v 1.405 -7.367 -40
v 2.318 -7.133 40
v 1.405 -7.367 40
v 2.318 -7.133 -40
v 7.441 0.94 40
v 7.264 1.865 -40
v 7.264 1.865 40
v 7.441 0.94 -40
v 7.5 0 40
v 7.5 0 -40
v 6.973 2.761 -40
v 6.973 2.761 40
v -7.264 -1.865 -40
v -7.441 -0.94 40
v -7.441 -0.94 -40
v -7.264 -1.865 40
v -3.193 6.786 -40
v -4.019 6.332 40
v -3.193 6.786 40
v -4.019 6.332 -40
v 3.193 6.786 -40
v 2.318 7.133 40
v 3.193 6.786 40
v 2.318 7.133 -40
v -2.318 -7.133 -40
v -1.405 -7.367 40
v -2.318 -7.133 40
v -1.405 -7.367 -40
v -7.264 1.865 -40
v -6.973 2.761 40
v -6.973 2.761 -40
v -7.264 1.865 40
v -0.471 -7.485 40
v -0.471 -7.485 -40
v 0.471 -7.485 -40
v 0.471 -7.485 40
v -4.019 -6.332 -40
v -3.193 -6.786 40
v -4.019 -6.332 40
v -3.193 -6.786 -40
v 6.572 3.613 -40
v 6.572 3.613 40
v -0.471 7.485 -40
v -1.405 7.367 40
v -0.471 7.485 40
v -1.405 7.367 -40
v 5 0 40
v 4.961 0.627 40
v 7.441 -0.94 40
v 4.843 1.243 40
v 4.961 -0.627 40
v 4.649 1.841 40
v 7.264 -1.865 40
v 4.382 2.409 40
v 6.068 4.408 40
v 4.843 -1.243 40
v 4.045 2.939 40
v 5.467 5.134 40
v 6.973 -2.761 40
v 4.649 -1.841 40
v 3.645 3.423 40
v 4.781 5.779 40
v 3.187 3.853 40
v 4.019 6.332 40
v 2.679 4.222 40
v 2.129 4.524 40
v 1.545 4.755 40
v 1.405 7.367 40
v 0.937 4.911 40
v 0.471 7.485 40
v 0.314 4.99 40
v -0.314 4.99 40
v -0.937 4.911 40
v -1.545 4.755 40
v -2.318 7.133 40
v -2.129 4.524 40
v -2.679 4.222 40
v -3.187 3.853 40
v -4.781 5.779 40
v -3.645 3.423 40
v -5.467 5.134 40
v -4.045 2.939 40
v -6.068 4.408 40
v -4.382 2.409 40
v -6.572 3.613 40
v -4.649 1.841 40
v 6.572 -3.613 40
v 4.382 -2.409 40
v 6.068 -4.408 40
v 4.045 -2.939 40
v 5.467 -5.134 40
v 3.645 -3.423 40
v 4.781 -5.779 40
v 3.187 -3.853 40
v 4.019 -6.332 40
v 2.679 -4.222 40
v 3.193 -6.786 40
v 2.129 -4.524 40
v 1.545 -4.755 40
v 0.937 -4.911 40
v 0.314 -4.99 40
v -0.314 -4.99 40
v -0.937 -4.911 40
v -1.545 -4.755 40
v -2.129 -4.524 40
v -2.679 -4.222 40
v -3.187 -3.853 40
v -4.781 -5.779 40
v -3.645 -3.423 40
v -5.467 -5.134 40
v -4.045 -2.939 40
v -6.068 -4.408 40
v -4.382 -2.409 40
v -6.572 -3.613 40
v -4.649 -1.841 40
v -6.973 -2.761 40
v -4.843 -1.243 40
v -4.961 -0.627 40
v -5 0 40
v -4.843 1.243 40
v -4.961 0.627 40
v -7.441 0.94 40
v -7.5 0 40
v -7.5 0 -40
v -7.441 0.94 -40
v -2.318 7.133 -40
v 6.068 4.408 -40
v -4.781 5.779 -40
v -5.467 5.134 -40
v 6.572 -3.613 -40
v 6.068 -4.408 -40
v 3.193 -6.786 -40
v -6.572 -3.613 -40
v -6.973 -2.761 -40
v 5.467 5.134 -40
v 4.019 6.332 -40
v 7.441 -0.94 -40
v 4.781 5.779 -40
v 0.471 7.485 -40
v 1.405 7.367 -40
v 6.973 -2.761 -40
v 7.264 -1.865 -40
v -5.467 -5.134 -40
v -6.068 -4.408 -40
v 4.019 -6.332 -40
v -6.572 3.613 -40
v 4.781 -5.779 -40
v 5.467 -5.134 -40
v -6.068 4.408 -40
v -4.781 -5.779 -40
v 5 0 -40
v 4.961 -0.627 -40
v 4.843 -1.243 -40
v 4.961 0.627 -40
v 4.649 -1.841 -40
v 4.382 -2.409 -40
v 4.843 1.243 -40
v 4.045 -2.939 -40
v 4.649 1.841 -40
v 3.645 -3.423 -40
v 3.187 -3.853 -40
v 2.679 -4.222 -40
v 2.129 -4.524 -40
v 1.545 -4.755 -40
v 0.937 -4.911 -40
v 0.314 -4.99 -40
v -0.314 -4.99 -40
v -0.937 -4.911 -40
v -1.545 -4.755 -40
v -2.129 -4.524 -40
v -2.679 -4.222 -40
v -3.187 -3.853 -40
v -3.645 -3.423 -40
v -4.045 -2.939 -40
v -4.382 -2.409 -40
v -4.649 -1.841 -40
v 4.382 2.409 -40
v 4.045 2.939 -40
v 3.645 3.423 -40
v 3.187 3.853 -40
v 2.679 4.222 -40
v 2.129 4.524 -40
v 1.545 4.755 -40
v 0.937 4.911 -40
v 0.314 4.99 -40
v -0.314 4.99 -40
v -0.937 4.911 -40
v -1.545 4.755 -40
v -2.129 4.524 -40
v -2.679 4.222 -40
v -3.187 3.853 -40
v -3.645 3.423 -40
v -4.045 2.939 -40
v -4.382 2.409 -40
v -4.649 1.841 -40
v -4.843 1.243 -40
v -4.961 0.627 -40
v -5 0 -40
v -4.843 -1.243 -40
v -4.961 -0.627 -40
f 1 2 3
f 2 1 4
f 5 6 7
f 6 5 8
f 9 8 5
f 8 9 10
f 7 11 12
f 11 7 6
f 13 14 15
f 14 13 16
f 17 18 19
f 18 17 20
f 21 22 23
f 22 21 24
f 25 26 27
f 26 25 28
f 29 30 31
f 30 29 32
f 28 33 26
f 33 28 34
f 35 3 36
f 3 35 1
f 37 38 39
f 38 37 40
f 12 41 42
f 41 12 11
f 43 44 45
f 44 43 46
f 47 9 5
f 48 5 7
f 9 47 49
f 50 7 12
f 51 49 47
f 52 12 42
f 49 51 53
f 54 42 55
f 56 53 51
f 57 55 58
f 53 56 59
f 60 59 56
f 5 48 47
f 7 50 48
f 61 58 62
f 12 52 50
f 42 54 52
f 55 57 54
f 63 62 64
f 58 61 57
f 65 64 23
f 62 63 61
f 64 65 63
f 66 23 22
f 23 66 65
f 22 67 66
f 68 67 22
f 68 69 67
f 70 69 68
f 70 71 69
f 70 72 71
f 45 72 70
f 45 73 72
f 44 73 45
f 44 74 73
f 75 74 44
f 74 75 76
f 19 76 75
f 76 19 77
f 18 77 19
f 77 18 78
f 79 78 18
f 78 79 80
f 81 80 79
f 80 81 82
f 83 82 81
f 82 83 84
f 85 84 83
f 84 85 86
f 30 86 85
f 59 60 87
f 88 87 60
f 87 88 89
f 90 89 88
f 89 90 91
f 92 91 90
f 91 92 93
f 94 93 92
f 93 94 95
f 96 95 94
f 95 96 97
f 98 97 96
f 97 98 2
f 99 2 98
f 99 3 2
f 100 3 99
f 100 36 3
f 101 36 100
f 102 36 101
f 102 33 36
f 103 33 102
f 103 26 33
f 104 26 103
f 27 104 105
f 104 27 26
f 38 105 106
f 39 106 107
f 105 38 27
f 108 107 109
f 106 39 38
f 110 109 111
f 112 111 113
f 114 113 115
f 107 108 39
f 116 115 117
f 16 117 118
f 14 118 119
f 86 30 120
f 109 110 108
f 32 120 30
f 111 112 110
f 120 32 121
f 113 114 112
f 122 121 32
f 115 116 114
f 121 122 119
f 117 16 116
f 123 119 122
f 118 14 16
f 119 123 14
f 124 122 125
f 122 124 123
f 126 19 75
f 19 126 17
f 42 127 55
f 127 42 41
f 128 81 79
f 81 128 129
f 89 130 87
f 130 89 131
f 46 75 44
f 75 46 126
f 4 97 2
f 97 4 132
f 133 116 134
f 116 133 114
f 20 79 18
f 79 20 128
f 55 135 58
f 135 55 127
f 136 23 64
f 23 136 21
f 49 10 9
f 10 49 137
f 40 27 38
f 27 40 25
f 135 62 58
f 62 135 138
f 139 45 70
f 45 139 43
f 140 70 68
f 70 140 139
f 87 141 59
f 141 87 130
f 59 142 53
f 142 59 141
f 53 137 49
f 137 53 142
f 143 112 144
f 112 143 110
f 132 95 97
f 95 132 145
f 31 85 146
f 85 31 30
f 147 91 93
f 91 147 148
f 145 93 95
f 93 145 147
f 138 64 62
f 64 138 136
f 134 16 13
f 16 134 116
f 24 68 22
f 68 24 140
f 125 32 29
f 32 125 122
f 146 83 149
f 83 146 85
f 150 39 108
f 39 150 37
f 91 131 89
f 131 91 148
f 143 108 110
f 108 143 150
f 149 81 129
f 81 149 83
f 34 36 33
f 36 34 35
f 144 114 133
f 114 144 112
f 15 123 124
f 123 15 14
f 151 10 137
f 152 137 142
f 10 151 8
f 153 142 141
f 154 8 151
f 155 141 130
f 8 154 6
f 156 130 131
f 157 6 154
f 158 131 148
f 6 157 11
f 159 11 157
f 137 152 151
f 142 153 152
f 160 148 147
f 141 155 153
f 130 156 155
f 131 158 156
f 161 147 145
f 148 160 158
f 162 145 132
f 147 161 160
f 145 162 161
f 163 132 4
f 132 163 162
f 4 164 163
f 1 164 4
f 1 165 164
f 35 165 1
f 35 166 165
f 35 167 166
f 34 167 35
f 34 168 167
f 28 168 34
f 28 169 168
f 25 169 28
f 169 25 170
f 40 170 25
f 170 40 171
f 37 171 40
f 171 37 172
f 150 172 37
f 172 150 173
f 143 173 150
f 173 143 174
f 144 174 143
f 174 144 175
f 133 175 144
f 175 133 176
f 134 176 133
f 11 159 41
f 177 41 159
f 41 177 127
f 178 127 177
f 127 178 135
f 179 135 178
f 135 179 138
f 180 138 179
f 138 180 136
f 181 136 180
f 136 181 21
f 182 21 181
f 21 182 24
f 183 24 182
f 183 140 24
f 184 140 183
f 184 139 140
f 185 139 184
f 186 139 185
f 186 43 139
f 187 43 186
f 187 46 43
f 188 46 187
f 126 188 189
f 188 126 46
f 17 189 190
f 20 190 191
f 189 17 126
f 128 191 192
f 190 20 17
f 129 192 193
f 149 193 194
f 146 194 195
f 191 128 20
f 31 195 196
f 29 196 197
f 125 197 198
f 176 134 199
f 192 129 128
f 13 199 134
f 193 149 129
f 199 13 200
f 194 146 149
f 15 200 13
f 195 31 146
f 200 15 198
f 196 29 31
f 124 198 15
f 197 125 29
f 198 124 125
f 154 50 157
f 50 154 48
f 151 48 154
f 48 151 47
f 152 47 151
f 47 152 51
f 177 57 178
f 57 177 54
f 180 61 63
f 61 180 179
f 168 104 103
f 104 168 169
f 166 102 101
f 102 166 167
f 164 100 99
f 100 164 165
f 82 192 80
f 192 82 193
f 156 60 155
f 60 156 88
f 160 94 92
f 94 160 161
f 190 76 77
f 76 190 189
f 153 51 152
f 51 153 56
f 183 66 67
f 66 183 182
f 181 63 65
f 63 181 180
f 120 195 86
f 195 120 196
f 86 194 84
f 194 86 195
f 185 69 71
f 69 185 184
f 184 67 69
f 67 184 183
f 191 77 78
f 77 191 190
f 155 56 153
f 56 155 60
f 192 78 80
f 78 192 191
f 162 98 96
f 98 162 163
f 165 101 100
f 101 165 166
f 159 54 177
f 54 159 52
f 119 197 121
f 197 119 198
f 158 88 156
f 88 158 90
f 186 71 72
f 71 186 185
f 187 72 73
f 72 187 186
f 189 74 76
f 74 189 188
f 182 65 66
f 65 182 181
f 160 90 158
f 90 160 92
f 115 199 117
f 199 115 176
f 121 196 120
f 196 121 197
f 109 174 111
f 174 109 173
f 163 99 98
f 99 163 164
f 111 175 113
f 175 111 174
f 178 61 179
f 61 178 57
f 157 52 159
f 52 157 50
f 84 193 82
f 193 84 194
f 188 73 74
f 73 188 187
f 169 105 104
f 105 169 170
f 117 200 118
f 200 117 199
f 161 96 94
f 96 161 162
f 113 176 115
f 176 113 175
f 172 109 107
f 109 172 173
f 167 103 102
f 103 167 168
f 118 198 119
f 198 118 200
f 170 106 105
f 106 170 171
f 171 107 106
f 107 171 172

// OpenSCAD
$fn = 50;


difference() {
	union() {
		translate(v = [0, 0, -40.0000000000]) {
			cylinder(h = 80, r = 7.5000000000);
		}
	}
	union() {
		translate(v = [0, 0, -100.0000000000]) {
			cylinder(h = 200, r = 5.0000000000);
		}
	}
}
